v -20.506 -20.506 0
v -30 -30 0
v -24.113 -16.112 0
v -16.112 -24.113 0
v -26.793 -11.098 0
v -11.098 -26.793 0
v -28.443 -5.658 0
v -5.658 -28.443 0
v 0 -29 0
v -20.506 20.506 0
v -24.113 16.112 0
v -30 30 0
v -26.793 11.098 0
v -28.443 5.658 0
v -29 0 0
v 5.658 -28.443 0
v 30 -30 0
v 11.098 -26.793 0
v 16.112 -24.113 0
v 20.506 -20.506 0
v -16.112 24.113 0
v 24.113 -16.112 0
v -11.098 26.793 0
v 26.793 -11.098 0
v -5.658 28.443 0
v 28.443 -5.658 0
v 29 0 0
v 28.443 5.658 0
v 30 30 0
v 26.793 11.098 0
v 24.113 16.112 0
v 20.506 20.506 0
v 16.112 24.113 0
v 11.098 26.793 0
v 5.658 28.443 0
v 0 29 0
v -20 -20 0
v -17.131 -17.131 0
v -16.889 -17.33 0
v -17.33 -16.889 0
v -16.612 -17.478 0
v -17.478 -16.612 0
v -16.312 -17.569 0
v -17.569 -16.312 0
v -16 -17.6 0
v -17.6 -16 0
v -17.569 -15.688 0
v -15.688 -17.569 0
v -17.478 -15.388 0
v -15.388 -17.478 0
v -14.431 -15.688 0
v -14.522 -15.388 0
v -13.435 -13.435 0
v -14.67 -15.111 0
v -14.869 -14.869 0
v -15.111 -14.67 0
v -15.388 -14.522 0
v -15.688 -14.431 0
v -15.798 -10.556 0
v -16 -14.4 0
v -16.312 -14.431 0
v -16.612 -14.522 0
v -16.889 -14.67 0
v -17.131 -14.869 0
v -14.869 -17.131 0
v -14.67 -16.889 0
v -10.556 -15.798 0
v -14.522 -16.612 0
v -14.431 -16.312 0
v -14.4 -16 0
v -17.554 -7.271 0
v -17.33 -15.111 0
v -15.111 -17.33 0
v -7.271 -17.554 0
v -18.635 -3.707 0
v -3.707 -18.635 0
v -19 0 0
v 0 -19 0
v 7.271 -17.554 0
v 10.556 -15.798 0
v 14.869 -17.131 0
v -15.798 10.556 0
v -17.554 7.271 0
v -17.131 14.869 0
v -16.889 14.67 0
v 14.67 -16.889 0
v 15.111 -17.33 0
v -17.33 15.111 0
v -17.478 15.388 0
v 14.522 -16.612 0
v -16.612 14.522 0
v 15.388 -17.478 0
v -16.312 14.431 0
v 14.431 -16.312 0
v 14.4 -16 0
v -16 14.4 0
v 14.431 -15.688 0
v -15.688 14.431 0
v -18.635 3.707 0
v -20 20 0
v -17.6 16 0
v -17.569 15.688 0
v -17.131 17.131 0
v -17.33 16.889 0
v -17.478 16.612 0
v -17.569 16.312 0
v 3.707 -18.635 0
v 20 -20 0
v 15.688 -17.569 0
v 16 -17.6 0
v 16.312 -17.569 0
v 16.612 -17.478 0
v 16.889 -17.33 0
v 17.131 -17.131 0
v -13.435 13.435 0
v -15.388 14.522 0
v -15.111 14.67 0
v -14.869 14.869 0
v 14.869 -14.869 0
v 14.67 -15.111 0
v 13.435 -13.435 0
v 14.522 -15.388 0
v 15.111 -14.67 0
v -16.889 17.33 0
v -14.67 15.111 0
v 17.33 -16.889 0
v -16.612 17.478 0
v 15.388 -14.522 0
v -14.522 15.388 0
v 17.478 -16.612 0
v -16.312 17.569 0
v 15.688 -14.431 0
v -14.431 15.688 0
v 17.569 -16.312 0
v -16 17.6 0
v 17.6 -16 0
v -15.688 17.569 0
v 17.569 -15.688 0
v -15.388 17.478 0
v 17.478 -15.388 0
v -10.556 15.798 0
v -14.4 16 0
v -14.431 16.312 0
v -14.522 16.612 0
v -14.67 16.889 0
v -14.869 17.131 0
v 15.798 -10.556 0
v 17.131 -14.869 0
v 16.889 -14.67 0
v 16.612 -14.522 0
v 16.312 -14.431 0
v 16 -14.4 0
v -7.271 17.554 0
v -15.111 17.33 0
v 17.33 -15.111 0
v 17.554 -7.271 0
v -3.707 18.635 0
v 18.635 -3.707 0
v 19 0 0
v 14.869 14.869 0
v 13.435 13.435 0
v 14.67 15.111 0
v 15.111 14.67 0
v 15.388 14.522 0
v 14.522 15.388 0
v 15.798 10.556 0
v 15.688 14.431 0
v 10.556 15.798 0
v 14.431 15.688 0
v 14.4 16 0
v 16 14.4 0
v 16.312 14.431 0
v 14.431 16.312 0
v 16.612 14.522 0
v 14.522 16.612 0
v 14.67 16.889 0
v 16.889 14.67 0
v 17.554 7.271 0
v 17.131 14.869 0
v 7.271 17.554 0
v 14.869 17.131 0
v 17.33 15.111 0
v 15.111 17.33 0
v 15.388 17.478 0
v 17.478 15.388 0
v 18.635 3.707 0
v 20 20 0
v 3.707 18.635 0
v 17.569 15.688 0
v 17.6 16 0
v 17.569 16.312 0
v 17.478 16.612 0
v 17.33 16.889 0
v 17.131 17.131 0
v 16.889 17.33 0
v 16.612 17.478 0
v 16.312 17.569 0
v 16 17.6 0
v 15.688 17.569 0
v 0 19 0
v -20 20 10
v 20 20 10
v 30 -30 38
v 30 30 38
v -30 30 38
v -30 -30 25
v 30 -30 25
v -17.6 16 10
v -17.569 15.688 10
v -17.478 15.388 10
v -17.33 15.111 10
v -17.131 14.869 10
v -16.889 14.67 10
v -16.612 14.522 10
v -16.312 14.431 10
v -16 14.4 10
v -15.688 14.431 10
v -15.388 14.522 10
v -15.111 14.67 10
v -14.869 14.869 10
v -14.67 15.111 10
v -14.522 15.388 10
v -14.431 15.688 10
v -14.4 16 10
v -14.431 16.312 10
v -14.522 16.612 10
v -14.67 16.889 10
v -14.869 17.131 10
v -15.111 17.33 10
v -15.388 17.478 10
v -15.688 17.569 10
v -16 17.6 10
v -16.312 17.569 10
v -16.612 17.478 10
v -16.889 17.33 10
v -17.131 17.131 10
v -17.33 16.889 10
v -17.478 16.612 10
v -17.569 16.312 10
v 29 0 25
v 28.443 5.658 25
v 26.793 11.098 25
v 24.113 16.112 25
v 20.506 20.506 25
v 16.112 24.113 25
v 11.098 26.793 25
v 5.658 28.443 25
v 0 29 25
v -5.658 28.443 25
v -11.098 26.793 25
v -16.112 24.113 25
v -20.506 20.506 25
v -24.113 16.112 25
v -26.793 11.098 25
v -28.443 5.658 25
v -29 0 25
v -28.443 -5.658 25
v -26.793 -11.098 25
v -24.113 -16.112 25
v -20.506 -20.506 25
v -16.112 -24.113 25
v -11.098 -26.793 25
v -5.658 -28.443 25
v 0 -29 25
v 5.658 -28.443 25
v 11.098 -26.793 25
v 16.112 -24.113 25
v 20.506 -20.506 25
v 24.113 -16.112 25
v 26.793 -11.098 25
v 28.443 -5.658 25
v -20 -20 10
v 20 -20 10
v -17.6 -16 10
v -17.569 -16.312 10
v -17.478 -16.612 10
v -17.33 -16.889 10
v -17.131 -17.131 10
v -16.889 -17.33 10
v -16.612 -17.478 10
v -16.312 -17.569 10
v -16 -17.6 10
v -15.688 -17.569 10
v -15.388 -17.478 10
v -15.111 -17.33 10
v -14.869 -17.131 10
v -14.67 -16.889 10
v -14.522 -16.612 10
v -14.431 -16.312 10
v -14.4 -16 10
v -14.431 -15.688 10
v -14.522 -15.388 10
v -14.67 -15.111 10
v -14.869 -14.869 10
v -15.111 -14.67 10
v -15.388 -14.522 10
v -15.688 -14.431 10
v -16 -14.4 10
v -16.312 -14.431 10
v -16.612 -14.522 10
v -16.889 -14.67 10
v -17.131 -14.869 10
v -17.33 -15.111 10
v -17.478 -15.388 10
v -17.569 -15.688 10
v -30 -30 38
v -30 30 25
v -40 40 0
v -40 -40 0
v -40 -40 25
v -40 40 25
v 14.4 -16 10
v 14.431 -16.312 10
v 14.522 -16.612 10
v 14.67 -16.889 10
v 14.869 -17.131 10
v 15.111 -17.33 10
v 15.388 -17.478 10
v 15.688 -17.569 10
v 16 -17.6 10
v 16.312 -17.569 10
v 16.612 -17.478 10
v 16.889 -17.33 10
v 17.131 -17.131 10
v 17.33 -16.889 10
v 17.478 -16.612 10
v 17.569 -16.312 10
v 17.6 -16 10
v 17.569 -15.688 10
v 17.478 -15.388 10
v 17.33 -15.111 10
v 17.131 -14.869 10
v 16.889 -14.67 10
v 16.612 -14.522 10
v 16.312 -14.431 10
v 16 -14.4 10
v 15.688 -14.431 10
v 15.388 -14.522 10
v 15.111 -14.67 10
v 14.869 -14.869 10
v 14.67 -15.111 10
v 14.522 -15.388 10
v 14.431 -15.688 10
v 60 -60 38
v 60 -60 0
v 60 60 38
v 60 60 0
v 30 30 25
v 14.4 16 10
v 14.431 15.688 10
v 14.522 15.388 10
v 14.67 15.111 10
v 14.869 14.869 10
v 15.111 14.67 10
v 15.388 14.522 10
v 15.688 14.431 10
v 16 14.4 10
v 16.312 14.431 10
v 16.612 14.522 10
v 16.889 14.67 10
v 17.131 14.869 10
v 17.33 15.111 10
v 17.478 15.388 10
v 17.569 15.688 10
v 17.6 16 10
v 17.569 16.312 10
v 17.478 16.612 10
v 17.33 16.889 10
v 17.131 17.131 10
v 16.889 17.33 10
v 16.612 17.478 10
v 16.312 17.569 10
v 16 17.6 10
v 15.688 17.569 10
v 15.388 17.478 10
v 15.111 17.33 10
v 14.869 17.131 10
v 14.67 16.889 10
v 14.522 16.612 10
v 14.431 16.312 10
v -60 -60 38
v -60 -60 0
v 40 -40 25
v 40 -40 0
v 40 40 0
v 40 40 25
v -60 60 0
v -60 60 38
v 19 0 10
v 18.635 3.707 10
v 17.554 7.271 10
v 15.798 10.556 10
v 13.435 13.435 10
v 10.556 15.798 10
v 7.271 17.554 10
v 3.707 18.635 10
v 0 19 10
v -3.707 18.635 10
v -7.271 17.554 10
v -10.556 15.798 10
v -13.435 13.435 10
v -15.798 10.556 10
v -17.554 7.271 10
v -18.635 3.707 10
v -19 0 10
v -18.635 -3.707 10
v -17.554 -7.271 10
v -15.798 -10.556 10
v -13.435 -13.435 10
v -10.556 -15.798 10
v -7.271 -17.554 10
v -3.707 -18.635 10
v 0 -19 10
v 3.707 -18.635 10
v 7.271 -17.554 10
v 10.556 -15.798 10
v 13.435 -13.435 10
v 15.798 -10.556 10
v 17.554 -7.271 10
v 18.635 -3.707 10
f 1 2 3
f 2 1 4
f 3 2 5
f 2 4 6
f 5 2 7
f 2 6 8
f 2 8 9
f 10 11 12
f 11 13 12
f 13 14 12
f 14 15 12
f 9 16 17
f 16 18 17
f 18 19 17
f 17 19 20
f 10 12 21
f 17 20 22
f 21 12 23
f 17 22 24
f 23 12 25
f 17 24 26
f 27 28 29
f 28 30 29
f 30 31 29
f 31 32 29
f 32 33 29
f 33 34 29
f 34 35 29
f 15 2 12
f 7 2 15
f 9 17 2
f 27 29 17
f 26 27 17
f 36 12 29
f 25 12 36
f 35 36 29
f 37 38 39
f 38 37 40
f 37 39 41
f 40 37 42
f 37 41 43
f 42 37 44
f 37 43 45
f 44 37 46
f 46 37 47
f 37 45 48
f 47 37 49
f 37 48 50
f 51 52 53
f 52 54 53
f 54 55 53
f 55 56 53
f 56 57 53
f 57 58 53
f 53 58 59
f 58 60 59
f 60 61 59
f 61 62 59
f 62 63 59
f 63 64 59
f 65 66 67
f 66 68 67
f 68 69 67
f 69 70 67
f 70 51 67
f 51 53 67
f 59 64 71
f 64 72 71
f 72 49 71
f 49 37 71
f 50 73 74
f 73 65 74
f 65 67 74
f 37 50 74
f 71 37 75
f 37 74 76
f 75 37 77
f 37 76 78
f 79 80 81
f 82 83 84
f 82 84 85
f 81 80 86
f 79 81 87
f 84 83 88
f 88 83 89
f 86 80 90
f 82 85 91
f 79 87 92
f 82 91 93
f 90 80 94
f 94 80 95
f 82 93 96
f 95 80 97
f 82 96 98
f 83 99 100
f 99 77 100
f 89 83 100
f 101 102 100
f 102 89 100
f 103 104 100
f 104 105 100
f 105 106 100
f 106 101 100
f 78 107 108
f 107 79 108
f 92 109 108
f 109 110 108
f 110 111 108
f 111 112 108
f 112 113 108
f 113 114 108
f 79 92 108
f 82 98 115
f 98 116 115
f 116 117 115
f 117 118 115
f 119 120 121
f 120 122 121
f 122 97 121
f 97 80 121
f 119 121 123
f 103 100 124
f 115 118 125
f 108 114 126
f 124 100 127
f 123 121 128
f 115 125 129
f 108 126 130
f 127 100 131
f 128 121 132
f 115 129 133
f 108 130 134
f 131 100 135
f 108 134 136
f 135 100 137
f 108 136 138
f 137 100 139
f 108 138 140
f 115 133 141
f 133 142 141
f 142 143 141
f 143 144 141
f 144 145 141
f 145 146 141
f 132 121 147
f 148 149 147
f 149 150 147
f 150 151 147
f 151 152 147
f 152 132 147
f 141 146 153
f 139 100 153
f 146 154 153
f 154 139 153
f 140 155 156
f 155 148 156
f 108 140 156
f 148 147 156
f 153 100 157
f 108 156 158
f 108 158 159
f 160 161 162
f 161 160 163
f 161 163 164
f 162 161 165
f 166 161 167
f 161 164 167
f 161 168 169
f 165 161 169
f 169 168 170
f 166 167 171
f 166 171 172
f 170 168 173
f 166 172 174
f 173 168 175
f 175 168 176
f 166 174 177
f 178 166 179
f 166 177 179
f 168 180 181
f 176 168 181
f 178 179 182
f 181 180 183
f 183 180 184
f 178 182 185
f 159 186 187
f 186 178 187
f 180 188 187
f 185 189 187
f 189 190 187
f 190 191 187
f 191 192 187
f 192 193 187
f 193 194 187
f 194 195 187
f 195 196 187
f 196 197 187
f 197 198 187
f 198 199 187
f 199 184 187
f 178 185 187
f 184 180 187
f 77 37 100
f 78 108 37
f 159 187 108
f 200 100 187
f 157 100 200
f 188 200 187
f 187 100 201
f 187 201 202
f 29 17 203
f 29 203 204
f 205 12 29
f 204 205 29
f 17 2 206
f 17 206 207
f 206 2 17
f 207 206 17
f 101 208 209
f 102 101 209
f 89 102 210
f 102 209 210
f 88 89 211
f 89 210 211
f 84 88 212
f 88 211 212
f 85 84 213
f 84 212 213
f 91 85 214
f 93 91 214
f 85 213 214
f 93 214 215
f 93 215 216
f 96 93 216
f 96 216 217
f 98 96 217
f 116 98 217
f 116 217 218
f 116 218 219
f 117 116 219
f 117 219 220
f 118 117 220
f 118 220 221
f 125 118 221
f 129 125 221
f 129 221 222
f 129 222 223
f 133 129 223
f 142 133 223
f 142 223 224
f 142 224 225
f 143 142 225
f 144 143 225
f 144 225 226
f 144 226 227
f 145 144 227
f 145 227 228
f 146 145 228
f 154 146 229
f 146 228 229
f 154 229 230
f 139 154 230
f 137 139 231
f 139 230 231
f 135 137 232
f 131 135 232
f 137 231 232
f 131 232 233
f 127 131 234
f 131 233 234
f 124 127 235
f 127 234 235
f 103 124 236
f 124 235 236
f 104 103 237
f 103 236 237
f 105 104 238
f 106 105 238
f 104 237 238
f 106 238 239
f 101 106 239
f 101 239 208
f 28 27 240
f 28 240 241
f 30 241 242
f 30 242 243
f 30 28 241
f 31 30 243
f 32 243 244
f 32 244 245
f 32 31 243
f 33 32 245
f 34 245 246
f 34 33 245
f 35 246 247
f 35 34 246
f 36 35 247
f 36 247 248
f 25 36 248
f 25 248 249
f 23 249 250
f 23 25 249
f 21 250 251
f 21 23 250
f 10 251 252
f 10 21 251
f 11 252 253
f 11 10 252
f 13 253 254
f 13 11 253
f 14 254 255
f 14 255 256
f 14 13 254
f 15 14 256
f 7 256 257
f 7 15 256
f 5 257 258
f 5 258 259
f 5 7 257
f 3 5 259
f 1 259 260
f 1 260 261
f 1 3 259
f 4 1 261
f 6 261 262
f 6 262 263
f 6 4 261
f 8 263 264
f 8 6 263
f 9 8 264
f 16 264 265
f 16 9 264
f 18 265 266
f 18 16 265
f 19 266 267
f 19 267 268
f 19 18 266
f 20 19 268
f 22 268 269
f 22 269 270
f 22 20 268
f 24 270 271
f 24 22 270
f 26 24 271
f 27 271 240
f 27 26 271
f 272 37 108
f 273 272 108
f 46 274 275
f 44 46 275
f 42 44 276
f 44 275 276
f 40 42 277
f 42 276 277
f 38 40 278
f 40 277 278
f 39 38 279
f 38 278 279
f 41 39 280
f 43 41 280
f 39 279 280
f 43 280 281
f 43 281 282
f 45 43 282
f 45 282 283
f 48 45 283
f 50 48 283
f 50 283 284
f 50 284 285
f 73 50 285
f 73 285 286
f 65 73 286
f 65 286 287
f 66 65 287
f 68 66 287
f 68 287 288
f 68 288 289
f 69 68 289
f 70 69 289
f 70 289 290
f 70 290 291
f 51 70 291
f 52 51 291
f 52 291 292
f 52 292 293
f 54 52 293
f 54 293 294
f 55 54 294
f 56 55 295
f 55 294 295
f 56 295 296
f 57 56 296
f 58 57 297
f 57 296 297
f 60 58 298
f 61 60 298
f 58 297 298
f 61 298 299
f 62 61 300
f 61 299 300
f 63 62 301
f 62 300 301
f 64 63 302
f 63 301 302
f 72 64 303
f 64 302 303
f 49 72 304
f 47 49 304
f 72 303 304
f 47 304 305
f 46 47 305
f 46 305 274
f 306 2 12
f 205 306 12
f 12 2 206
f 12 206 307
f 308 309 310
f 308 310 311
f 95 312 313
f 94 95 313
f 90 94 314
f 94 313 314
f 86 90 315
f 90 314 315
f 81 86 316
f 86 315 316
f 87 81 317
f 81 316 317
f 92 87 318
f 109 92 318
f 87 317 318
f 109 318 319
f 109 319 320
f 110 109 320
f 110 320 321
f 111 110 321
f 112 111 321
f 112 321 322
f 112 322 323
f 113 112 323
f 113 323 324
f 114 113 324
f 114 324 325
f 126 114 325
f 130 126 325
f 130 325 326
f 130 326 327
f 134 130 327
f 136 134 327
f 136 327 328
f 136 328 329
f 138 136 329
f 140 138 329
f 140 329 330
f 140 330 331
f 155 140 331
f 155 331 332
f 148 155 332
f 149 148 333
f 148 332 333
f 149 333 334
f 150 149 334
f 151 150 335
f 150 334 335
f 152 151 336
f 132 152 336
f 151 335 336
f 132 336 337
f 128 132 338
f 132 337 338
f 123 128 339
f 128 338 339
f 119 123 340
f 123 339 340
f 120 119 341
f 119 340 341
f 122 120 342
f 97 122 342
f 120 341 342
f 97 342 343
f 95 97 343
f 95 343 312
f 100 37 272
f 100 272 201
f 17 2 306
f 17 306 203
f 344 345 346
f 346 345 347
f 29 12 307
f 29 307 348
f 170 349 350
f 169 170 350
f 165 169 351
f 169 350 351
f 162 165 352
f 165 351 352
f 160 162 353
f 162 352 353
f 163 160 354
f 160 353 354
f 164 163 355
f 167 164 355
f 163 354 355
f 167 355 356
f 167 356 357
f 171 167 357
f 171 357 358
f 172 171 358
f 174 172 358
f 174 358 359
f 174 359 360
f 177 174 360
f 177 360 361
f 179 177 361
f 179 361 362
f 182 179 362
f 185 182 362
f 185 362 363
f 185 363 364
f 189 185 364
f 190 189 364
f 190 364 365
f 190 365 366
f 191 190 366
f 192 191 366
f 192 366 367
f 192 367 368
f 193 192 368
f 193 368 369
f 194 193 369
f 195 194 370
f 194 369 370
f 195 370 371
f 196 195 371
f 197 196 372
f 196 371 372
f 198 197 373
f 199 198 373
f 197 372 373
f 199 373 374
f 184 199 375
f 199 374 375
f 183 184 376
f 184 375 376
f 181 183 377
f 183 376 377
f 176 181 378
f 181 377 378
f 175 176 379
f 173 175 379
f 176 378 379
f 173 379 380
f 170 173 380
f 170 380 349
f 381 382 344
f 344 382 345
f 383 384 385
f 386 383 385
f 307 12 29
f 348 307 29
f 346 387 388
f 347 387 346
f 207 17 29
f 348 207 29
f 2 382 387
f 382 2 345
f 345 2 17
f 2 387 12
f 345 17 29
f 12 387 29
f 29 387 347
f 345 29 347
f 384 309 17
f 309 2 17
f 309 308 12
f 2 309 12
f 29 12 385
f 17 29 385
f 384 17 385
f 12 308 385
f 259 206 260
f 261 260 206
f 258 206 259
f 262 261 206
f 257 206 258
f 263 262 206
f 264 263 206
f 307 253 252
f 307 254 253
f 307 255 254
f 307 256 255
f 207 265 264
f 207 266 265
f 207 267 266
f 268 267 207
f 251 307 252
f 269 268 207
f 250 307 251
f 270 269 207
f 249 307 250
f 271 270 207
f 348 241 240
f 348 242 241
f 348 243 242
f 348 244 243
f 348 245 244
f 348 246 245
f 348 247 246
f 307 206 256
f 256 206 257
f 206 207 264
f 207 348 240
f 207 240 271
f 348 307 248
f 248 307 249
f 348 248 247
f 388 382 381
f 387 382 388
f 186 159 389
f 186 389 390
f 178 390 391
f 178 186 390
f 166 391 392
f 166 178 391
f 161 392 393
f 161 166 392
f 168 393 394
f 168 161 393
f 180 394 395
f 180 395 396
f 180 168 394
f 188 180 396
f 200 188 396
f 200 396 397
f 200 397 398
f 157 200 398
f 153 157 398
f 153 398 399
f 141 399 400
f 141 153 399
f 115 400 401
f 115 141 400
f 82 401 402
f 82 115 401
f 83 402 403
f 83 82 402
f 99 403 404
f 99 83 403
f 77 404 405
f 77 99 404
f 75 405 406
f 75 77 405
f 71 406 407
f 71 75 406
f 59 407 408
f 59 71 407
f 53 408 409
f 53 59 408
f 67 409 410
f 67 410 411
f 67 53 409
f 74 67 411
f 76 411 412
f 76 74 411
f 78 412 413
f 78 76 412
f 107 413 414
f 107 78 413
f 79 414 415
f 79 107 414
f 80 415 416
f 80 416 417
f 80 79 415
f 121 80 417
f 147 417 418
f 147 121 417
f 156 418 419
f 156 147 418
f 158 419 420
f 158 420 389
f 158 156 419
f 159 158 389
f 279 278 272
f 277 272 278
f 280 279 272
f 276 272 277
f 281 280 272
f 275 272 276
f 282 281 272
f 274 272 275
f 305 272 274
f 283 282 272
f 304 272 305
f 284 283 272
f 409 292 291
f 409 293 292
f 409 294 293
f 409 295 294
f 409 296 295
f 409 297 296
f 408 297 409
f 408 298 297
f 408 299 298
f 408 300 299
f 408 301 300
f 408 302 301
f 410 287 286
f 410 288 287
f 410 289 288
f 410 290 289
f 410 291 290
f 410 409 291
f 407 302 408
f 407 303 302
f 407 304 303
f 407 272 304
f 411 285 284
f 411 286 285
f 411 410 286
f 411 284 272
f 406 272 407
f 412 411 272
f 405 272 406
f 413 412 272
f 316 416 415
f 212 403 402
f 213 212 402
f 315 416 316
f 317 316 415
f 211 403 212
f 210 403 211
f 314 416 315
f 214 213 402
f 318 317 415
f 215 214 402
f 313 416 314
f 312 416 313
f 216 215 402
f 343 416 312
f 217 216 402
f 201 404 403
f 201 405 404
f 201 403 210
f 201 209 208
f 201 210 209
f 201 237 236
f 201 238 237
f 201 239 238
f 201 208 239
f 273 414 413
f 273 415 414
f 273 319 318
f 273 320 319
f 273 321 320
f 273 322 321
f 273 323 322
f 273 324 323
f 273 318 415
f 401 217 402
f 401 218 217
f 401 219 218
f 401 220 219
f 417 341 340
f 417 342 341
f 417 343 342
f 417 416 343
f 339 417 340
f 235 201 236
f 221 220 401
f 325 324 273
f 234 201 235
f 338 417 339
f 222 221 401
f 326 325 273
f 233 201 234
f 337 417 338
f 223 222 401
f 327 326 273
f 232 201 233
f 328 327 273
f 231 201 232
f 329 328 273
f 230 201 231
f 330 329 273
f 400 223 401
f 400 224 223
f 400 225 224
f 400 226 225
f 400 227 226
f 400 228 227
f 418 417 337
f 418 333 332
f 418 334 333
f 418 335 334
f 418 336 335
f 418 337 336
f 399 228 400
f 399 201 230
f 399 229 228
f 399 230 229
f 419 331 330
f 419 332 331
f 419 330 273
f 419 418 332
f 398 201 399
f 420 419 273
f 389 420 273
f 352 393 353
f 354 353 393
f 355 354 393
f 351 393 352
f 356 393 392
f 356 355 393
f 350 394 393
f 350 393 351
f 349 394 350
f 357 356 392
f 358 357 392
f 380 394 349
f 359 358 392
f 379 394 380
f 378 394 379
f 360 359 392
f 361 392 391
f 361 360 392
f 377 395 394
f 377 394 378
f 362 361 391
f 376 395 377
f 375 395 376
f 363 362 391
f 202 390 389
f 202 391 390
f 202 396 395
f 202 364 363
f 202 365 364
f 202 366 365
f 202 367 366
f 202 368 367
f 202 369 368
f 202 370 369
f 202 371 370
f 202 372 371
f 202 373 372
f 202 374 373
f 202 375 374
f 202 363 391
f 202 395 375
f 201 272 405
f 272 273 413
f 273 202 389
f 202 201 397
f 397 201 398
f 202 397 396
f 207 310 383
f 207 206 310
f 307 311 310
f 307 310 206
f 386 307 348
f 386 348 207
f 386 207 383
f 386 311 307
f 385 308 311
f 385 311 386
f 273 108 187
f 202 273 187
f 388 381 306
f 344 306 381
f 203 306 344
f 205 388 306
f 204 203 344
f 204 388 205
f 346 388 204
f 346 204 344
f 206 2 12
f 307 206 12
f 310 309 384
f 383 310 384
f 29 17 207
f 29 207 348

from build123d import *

# Parameters (mm, degrees)
F0_W     = 120
F0_H     = 120
F0_W_2   = 80
F0_H_2   = 80
F0_W_3   = 60
F0_H_3   = 60
F1_DEPTH = 38
F2_DEPTH = 25
F0_R     = 29
F3_DEPTH = 25
F0_W_4   = 40
F0_H_4   = 40
F0_R_2   = 19
F4_DEPTH = 10
F5_D     = 3.2


with BuildPart() as f1:
    # F0 (on Top) → F1 (new body)
    with BuildSketch(Plane.XY):
        Rectangle(F0_W, F0_H)
        Rectangle(F0_W_2, F0_H_2, mode=Mode.SUBTRACT)
        Rectangle(F0_W_2, F0_H_2)
        Rectangle(F0_W_3, F0_H_3, mode=Mode.SUBTRACT)
    extrude(amount=F1_DEPTH)


with BuildPart() as f2:
    # F0 (on Top) → F2 (new body)
    with BuildSketch(Plane.XY):
        Rectangle(F0_W_2, F0_H_2)
        Rectangle(F0_W_3, F0_H_3, mode=Mode.SUBTRACT)
    extrude(amount=F2_DEPTH)


with BuildPart() as f3:
    # F0 (on Top) → F3 (new body)
    with BuildSketch(Plane.XY):
        Rectangle(F0_W_3, F0_H_3)
        Circle(F0_R, mode=Mode.SUBTRACT)
    extrude(amount=F3_DEPTH)


with BuildPart() as f4:
    # F0 (on Top) → F4 (new body)
    with BuildSketch(Plane.XY):
        Rectangle(F0_W_4, F0_H_4)
        Circle(F0_R_2, mode=Mode.SUBTRACT)
    extrude(amount=F4_DEPTH)

    # F5 (through all)
    with Locations(Plane(origin=(0, 0, 0), x_dir=(1, 0, 0), z_dir=(0, 0, -1))):
        with Locations((-16.000001, 16), (16, 16), (16.000001, -16), (-16, -16)):
            Hole(F5_D / 2)


solid = Compound([f1.part, f2.part, f3.part, f4.part])
